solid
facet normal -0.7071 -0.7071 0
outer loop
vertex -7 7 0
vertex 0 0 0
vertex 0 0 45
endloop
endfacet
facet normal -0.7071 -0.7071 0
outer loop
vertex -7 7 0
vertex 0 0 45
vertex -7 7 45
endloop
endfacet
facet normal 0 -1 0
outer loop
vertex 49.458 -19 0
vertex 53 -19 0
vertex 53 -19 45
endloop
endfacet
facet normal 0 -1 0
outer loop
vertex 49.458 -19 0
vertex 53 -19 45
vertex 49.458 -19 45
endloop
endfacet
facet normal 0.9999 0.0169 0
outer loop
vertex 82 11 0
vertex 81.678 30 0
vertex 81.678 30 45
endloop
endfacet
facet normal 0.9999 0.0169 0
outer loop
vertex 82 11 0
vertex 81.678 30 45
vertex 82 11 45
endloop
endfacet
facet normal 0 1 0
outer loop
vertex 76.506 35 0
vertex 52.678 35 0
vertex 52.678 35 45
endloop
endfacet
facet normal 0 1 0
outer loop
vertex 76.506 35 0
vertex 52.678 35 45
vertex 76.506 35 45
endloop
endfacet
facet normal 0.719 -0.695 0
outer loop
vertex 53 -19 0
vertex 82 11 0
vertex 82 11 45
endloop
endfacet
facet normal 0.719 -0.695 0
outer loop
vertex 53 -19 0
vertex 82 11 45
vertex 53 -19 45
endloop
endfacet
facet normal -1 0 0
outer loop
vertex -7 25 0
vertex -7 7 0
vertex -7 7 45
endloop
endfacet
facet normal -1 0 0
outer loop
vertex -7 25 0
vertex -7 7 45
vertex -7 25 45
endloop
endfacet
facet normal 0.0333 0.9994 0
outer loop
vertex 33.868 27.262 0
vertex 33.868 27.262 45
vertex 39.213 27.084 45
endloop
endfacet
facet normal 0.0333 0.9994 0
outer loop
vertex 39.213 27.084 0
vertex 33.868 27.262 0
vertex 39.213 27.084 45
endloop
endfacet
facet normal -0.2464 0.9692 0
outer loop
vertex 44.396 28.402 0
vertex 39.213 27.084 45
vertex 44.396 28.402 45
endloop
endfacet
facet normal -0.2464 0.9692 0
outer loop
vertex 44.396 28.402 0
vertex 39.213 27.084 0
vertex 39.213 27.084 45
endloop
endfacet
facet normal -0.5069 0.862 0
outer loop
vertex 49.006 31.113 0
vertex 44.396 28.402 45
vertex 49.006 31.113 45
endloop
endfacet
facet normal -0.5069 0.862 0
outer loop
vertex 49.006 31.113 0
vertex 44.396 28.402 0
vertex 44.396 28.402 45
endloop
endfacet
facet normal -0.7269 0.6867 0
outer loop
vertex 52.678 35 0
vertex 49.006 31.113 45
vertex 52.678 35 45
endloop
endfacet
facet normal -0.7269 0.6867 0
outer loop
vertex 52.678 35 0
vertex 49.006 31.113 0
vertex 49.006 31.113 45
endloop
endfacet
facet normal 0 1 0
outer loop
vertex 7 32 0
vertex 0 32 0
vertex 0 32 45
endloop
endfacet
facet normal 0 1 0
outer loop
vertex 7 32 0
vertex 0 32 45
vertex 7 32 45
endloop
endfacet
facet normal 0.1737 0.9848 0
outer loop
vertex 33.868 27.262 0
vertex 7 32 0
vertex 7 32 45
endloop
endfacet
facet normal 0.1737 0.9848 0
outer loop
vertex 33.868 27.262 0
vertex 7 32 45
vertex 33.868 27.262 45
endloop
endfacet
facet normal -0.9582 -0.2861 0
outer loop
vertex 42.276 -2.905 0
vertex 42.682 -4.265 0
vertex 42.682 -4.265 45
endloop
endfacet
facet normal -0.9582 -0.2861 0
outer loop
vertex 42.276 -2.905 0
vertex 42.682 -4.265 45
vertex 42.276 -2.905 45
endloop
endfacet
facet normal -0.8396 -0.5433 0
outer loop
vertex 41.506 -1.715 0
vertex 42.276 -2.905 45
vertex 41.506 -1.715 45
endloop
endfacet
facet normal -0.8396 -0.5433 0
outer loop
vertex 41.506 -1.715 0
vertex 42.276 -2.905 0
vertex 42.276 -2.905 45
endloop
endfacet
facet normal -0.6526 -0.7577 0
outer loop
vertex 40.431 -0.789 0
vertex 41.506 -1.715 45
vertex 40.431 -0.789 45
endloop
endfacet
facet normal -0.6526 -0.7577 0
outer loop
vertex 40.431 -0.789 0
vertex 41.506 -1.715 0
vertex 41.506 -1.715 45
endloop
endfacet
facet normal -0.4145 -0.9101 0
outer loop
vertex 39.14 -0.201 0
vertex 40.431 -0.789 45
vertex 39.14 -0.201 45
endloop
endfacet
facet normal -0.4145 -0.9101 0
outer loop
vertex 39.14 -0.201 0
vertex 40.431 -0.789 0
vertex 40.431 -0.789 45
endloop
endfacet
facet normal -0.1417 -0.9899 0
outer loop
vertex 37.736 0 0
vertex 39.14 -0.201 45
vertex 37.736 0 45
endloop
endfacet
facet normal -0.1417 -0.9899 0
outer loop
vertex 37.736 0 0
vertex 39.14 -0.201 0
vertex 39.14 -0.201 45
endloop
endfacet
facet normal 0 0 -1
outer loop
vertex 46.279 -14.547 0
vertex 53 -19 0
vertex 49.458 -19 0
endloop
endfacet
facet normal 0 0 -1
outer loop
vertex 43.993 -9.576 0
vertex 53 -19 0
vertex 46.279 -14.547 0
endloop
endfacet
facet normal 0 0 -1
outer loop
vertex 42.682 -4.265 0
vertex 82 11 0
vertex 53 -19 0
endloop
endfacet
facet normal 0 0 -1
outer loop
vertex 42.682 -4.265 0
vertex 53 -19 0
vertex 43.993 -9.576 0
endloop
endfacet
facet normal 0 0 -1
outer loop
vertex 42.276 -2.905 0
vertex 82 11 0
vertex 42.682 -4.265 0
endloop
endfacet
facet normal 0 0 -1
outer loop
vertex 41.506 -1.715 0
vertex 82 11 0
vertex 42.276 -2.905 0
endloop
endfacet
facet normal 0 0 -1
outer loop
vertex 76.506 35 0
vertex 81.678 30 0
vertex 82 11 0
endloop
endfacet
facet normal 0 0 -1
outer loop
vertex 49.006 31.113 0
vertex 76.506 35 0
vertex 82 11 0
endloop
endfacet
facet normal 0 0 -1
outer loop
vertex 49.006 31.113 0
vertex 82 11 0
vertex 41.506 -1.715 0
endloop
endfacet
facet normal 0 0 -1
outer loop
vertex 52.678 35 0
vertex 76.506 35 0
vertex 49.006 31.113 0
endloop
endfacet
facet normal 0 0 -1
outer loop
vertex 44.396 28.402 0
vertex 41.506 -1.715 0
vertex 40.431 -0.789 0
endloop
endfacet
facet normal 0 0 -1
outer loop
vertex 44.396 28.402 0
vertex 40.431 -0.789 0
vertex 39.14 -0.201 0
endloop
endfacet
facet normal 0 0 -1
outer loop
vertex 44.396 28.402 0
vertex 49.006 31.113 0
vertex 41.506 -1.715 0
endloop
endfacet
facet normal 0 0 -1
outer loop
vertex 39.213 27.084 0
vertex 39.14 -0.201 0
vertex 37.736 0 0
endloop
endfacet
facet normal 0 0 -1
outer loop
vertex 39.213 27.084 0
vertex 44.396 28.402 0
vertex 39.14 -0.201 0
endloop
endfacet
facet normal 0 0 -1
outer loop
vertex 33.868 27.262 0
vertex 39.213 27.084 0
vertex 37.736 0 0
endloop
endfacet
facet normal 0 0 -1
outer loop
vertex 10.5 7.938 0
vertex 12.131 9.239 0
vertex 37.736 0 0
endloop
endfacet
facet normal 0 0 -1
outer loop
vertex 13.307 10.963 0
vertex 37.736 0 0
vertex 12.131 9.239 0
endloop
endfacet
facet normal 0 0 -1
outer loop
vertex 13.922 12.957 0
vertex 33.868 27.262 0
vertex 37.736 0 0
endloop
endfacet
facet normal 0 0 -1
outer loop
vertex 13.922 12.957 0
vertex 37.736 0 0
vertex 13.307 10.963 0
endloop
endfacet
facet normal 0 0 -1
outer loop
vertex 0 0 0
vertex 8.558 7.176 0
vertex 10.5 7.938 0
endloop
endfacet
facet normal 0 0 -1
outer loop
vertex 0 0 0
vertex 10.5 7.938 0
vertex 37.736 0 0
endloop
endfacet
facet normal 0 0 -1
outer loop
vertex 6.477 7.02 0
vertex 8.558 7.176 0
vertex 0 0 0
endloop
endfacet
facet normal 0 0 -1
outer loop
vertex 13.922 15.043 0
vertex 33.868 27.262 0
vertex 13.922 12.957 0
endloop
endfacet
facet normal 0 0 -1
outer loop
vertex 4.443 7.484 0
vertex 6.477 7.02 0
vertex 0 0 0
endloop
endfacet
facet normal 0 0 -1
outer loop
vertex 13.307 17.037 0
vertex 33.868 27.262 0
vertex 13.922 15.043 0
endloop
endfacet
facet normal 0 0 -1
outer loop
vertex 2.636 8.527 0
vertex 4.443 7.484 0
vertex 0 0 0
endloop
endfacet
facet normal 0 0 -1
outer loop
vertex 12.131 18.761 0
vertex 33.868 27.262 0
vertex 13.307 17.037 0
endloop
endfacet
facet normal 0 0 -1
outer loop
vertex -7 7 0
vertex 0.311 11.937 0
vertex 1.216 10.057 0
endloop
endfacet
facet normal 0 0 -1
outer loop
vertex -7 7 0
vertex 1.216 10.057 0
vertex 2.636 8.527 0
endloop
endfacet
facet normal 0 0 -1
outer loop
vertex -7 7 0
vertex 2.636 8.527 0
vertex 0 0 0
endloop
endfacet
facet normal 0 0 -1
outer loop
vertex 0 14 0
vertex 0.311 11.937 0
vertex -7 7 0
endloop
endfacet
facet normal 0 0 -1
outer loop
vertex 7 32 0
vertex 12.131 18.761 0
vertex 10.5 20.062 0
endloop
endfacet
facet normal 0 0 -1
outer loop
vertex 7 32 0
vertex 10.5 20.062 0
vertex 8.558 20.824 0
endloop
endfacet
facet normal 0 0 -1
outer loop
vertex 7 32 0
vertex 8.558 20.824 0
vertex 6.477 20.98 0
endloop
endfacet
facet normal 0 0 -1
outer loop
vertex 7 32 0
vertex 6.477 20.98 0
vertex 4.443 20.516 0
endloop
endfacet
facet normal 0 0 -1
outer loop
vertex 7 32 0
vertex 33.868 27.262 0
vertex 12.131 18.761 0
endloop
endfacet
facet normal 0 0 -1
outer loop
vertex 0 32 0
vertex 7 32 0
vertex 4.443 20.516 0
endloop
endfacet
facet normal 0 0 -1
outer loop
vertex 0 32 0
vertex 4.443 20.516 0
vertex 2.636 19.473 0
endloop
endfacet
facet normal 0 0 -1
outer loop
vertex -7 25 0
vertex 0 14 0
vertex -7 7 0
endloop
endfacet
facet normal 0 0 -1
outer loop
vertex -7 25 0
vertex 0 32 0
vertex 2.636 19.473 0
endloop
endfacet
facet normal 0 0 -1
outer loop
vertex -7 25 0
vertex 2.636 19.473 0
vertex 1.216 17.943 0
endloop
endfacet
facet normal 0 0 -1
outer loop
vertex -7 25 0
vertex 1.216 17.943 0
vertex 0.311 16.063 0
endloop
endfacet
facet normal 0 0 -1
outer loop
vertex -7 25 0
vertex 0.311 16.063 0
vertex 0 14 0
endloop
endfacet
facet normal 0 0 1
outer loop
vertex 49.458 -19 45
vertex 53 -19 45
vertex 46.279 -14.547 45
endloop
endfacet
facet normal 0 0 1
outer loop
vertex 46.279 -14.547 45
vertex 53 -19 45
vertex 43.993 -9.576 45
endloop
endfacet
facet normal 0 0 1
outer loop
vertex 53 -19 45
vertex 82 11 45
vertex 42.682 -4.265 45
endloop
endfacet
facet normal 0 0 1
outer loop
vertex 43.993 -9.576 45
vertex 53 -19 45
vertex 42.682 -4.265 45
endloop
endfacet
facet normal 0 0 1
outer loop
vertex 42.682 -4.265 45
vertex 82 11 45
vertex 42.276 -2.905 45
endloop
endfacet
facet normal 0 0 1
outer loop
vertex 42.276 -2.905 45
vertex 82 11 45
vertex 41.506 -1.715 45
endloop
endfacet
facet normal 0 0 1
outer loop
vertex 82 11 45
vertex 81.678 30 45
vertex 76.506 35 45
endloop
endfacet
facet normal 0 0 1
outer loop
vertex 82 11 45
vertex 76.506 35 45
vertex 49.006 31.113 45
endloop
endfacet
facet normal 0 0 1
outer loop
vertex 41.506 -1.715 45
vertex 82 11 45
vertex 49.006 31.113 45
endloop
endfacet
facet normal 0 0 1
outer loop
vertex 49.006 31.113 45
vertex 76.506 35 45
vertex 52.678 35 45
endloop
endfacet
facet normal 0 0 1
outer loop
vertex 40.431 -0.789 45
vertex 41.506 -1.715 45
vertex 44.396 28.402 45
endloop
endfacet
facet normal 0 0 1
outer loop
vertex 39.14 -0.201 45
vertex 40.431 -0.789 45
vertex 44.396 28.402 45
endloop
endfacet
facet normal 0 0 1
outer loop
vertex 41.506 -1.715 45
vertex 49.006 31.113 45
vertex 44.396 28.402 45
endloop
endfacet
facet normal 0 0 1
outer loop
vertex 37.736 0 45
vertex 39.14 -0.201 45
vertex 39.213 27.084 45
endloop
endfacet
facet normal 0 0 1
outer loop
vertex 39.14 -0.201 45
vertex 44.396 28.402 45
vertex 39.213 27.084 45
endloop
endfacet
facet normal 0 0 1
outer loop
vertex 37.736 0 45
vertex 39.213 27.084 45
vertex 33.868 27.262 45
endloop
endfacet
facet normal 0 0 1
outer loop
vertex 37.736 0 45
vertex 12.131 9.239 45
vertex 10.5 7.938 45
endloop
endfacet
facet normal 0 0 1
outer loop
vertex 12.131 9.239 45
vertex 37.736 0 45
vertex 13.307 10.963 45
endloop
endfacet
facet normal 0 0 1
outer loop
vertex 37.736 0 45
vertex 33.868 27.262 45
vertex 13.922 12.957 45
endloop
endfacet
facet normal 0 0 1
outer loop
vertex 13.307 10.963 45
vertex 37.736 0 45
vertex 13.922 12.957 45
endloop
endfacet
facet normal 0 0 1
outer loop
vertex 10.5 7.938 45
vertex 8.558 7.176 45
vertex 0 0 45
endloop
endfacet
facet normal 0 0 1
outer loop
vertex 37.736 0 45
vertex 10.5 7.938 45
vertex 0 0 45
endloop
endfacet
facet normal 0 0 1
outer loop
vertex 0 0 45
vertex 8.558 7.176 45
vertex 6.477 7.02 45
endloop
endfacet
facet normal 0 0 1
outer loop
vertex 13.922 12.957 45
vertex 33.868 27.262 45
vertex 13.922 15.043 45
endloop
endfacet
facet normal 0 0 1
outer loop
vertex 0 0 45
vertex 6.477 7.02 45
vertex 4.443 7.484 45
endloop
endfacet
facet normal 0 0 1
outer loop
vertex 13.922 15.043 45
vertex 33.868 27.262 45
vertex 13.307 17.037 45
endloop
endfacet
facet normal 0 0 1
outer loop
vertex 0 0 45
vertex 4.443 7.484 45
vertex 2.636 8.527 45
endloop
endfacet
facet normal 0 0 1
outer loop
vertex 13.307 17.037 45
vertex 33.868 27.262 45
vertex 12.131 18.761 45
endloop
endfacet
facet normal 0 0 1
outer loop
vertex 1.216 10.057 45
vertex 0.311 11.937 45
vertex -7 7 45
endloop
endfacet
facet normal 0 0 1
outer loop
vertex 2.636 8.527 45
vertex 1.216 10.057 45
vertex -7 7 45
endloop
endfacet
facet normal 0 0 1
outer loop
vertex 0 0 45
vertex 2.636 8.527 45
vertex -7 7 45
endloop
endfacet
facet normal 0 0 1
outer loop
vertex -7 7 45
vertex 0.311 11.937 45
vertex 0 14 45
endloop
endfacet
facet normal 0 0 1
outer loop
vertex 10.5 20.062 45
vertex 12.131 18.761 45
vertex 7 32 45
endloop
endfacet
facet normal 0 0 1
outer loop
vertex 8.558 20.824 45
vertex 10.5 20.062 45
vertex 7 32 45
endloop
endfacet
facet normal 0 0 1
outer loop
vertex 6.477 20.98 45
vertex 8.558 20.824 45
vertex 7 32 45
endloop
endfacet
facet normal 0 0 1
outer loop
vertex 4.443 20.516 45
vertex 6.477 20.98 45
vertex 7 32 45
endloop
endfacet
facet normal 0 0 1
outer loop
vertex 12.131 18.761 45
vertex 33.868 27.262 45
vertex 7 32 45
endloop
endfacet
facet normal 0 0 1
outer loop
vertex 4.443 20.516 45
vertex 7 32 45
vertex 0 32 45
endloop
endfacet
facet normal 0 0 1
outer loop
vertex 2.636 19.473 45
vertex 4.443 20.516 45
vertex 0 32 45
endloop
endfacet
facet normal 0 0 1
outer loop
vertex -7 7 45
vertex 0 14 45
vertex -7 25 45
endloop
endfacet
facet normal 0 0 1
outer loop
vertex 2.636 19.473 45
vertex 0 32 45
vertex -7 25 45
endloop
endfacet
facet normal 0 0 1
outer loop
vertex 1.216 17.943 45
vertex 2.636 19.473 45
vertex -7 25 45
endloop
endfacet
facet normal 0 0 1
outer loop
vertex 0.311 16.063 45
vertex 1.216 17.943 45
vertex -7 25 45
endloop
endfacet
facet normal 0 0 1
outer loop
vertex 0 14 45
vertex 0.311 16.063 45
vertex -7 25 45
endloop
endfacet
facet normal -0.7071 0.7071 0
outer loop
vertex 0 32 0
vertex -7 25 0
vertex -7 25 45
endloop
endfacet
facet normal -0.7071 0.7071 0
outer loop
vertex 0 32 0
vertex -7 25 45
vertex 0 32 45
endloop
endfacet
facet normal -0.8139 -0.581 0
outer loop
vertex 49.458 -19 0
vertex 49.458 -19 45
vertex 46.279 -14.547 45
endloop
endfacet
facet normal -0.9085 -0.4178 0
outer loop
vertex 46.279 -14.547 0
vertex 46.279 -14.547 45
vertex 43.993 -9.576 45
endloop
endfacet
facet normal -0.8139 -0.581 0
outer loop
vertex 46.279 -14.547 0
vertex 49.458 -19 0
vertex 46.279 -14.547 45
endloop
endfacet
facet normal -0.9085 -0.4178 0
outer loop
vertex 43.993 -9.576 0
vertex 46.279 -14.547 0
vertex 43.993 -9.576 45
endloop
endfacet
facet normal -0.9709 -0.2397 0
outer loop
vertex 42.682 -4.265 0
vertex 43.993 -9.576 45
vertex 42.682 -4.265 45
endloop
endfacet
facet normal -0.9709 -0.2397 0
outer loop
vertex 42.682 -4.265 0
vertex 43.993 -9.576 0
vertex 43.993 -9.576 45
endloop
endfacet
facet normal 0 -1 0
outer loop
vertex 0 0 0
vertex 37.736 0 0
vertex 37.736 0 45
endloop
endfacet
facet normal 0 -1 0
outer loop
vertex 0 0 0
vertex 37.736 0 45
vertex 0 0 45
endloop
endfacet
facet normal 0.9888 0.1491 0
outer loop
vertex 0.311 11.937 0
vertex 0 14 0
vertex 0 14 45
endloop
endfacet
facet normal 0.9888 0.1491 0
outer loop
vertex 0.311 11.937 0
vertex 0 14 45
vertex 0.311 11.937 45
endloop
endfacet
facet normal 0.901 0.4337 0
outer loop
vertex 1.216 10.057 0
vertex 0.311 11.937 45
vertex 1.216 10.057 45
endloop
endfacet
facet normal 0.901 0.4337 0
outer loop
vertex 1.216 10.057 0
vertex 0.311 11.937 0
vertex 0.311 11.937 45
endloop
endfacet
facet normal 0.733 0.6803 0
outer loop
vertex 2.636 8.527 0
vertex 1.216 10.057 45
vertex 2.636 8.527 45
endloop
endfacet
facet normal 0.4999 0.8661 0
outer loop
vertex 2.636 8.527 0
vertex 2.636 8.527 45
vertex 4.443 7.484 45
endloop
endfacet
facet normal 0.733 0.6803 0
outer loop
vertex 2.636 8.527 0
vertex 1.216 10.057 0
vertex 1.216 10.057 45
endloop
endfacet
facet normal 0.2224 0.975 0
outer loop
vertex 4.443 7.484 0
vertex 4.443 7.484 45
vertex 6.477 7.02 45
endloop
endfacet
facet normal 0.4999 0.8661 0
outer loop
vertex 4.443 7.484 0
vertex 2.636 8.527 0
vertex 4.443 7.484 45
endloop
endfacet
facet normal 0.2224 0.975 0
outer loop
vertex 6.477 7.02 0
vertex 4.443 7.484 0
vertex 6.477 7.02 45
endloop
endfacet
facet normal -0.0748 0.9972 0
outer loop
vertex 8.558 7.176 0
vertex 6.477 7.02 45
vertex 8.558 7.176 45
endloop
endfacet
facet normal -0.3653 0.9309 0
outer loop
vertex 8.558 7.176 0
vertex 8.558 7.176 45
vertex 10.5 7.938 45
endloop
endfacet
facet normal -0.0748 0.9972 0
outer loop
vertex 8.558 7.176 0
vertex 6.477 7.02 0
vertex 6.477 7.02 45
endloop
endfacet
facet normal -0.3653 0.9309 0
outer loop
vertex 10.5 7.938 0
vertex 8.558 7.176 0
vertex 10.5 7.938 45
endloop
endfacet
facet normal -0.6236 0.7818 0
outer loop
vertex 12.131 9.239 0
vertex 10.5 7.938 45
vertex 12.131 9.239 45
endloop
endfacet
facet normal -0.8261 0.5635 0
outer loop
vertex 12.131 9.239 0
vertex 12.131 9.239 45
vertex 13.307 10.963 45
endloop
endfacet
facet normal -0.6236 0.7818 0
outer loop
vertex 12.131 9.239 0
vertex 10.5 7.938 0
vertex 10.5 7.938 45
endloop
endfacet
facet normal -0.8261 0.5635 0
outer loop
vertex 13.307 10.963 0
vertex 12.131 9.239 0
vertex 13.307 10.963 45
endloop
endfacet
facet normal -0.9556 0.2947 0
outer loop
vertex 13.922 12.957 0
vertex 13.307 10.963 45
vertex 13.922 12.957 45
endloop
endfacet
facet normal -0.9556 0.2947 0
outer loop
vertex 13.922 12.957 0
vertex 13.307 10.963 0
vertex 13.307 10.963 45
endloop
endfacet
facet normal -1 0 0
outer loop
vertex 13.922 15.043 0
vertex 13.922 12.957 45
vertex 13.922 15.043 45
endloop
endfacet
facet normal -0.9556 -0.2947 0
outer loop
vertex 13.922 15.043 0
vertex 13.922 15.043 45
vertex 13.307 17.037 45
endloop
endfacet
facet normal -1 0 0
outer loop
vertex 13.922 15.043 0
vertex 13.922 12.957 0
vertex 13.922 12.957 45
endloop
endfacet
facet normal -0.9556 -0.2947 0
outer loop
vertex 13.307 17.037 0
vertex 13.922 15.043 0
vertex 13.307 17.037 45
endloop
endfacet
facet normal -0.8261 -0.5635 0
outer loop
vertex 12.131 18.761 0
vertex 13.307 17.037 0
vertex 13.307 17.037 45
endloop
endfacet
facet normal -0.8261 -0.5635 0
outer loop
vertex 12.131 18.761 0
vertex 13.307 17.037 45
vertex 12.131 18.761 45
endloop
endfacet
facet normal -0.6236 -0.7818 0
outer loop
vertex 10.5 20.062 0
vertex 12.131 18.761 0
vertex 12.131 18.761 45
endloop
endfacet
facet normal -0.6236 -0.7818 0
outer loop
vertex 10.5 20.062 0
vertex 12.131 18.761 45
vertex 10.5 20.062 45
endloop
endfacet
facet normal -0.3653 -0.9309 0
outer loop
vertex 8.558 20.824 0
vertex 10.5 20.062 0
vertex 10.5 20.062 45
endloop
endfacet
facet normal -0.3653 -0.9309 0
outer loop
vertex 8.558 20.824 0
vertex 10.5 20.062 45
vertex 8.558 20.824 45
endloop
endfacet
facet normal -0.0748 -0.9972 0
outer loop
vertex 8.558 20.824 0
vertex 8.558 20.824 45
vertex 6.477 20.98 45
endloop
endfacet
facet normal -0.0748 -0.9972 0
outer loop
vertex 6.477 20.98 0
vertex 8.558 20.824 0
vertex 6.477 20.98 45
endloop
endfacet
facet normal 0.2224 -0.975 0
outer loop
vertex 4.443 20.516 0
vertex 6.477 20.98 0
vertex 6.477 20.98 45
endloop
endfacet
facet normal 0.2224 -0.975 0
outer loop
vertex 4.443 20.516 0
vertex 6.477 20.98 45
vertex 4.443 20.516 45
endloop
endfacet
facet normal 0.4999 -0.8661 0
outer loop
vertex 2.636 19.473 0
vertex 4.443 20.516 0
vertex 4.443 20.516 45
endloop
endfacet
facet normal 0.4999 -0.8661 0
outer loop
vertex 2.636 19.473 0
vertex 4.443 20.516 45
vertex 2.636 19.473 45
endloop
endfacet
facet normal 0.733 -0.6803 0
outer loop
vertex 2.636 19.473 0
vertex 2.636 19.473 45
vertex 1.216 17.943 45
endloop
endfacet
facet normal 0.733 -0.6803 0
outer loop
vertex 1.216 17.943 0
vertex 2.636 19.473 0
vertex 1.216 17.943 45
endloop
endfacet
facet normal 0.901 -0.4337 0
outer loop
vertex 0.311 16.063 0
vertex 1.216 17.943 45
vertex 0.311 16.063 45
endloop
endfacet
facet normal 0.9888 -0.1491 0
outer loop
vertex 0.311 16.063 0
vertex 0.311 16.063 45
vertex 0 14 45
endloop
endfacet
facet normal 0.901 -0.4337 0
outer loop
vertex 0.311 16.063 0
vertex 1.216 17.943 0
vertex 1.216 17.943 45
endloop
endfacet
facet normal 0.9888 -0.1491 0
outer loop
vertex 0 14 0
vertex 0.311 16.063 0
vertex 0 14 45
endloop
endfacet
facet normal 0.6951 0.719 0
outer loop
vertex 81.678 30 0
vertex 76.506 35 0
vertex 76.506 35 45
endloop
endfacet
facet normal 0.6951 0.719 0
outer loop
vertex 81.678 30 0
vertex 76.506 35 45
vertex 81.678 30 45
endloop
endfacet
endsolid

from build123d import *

# Parameters (mm, degrees)
SKETCH1_R           = 7
BOSS_EXTRUDE1_DEPTH = 45


with BuildPart() as part:
    # Sketch1 → Boss-Extrude1 (new body)
    with BuildSketch(Plane.XY):
        with BuildLine():
            Line((0, 0), (-7, 7))
            Line((-7, 7), (-7, 25))
            Line((-7, 25), (0, 32))
            Line((0, 32), (7, 32))
            Line((7, 32), (33.868127266, 27.262424242))
            ThreePointArc((33.868127266, 27.262424242), (44.39557659, 28.402372071), (52.677966102, 35))
            Line((52.677966102, 35), (76.505552309, 35))
            Line((76.505552309, 35), (81.677966102, 30))
            Line((81.677966102, 30), (82, 11))
            Line((82, 11), (53, -19))
            Line((53, -19), (49.457764366, -19))
            ThreePointArc((49.457764366, -19), (45.01879217, -12.115672061), (42.681961966, -4.264705882))
            ThreePointArc((42.681961966, -4.264705882), (41.001559006, -1.213413768), (37.736323225, 0))
            Line((37.736323225, 0), (0, 0))
        make_face()
        with Locations(Location((7, 14, 0), (0, 0, 180))):
            Circle(SKETCH1_R, mode=Mode.SUBTRACT)
    extrude(amount=BOSS_EXTRUDE1_DEPTH)


solid = part.part
